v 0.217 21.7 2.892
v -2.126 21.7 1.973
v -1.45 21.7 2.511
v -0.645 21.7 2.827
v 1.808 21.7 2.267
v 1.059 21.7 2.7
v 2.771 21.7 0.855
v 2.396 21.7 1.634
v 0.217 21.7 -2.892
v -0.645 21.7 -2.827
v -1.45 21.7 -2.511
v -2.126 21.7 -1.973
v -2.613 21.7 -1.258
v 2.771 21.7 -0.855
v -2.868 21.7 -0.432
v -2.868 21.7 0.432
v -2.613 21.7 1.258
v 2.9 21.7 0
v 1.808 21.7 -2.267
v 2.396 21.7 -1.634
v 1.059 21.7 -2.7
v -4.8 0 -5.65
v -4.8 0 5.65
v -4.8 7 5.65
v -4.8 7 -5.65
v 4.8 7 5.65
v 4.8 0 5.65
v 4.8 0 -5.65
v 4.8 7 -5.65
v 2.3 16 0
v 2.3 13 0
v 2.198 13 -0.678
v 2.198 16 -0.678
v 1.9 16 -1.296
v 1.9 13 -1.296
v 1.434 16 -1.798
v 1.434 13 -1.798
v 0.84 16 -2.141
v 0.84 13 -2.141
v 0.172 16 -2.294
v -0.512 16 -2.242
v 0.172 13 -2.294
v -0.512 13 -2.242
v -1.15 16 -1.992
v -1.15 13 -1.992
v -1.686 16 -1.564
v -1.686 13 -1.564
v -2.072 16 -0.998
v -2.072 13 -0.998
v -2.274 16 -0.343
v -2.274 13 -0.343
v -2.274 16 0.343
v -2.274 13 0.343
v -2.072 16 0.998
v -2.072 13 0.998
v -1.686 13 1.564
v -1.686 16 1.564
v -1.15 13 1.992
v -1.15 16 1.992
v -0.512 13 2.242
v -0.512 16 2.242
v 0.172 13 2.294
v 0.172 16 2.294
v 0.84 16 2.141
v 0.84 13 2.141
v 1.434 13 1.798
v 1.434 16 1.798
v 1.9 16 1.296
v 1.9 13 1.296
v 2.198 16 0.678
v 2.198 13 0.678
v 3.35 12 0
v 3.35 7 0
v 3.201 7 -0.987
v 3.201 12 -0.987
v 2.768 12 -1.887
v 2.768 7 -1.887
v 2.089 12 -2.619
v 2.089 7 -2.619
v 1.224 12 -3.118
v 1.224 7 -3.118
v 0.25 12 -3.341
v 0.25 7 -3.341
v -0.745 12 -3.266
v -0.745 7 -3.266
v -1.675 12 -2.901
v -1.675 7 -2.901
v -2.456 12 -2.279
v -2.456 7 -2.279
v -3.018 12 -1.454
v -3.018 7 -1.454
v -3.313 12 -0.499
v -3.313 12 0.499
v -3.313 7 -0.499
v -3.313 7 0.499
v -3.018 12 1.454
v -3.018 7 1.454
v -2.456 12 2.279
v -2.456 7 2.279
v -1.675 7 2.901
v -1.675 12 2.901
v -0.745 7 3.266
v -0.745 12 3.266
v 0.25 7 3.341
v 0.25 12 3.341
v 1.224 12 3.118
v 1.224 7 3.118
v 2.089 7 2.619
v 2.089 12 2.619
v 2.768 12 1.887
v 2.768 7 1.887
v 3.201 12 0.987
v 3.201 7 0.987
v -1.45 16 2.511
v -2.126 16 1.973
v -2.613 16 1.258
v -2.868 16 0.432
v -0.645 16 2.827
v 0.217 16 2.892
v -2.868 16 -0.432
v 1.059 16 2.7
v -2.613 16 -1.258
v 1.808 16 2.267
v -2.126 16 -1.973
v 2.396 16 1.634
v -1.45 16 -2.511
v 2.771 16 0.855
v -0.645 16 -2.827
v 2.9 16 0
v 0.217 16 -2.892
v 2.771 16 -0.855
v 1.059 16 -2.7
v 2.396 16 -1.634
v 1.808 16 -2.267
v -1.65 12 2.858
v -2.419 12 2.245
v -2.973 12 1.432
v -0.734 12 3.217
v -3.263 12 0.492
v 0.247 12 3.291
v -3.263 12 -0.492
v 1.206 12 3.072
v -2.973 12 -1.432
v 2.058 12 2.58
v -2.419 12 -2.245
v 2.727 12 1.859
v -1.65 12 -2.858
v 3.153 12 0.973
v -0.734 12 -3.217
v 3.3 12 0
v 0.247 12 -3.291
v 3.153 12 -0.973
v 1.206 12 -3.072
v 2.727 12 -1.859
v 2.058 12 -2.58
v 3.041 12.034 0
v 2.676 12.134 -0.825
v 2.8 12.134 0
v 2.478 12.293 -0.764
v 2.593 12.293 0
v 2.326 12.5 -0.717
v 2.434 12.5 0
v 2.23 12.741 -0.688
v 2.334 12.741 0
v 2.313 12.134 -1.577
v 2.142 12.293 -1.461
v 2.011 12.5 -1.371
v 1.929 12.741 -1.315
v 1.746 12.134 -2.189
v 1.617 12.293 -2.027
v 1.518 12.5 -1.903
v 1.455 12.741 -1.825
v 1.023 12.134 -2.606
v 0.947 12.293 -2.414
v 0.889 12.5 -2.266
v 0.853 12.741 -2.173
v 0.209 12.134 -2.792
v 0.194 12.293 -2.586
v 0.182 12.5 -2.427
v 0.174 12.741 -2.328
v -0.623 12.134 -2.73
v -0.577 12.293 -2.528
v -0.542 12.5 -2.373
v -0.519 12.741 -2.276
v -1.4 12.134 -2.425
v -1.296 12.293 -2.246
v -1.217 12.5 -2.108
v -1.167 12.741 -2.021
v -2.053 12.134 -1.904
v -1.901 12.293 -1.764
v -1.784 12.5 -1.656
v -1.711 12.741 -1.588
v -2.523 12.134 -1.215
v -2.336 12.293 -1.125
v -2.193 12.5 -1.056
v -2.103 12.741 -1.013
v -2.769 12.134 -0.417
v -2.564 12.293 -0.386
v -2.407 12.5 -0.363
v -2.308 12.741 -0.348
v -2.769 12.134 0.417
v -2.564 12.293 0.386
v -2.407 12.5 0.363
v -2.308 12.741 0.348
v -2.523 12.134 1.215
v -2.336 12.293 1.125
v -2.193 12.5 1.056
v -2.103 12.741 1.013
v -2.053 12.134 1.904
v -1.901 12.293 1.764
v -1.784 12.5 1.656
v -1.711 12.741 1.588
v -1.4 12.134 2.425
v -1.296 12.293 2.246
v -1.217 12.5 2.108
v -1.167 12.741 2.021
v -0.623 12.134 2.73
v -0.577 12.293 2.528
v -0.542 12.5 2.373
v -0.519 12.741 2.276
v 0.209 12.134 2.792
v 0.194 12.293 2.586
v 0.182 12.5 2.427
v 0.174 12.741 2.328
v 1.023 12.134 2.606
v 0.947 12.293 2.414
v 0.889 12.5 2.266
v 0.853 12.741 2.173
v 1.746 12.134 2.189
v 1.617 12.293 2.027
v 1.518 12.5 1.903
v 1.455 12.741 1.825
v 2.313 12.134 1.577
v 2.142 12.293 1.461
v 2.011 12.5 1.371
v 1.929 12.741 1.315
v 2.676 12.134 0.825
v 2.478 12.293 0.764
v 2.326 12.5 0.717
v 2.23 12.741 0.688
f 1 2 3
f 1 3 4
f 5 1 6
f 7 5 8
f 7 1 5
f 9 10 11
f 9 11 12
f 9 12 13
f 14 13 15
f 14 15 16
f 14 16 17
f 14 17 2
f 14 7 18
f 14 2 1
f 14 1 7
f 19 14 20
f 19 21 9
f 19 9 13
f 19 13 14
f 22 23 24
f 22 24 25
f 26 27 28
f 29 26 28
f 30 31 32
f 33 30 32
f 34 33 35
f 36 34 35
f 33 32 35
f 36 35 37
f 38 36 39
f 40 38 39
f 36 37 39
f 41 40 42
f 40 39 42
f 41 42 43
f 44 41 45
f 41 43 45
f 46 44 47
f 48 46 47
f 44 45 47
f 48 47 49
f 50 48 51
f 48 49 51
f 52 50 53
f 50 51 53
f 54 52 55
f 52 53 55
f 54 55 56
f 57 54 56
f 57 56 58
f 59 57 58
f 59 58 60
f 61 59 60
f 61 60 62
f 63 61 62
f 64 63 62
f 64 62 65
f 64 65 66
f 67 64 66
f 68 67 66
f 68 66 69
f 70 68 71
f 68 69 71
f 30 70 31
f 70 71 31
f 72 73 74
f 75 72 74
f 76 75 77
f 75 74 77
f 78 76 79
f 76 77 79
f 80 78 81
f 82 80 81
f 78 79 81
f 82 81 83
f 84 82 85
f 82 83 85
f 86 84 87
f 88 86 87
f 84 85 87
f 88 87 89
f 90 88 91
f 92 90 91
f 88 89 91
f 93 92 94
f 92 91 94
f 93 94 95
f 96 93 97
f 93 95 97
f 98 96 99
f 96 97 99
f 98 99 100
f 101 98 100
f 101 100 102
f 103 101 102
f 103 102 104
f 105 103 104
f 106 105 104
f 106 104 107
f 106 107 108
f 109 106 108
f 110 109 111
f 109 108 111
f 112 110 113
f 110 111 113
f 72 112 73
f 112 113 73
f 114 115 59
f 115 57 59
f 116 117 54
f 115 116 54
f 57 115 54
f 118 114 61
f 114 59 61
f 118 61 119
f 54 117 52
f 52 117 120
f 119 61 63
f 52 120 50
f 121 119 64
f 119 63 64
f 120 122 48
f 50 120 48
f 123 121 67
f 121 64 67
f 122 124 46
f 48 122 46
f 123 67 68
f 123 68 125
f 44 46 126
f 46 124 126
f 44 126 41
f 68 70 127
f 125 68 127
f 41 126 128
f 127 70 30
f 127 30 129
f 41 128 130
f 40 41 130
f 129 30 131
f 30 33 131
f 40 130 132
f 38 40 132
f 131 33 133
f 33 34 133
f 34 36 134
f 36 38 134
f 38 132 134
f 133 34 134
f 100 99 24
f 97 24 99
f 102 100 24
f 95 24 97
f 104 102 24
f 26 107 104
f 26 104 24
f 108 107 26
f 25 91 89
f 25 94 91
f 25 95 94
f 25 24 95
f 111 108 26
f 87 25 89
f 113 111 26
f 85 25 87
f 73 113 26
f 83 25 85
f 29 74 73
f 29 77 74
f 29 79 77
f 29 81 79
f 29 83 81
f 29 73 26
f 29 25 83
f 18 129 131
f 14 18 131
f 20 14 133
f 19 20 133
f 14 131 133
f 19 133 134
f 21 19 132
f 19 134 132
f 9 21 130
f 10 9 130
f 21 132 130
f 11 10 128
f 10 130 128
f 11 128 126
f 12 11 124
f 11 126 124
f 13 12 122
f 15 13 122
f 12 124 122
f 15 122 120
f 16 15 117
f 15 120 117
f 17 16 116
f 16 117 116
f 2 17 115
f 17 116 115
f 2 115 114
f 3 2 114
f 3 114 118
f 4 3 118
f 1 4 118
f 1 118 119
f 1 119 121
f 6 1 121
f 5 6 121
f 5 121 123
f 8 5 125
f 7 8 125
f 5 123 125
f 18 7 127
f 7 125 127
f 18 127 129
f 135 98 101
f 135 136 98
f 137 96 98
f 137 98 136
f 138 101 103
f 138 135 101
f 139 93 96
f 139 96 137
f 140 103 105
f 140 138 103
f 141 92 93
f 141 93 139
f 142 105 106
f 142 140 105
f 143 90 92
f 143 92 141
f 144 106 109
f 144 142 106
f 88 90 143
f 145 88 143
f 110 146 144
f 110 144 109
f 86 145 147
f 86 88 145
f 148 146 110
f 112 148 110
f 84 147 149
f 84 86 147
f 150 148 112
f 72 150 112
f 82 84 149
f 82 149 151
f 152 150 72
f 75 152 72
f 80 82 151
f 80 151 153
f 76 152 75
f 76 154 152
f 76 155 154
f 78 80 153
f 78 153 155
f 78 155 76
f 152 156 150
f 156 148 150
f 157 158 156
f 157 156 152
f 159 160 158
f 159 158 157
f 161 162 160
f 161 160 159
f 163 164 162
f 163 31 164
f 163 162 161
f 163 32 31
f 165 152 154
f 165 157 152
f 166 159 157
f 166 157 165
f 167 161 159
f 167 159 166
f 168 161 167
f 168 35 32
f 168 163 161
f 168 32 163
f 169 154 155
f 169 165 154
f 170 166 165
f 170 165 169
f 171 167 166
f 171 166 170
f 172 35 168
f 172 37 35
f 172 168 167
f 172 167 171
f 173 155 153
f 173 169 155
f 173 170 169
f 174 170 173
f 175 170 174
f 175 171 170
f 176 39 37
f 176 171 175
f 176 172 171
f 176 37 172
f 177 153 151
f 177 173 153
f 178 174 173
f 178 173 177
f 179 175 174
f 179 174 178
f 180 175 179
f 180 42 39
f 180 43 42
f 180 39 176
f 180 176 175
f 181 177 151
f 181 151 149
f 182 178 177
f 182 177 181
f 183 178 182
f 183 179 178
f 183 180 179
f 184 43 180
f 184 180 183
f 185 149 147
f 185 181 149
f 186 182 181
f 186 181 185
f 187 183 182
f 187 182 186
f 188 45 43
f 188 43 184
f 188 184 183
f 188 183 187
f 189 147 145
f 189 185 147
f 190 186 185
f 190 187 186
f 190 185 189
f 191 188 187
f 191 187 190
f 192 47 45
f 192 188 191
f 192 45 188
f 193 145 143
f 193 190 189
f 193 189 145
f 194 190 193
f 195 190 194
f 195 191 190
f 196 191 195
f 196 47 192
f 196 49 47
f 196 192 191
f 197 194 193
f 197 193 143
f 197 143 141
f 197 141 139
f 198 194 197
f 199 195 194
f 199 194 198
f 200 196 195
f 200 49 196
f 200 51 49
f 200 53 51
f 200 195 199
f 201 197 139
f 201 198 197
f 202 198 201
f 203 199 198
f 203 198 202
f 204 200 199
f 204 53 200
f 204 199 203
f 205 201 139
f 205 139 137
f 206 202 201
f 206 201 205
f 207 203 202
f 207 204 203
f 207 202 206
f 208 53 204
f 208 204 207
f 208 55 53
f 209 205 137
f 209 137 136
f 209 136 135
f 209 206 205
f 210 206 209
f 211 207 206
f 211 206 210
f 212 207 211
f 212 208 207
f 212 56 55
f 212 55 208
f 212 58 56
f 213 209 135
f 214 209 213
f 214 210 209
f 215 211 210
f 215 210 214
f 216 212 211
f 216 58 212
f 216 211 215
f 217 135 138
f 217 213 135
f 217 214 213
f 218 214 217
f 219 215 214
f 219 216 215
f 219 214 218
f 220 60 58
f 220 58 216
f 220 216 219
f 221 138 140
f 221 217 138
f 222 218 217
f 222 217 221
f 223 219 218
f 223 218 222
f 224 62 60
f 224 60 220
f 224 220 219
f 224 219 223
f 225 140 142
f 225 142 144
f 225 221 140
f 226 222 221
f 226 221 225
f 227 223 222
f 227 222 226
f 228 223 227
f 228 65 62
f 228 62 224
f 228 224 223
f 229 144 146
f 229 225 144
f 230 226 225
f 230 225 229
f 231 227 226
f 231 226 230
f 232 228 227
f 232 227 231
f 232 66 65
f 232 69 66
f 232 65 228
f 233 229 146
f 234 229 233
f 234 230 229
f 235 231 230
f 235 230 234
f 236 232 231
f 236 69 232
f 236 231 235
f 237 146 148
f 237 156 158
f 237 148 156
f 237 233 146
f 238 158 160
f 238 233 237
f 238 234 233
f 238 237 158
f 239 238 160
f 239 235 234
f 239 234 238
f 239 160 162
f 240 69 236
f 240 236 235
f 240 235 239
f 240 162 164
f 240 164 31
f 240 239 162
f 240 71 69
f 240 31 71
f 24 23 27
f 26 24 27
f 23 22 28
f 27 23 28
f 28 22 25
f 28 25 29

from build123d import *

# Parameters (mm, degrees)
SKETCH1_W           = 9.6
SKETCH1_H           = 11.3
BOSS_EXTRUDE1_DEPTH = 7
SKETCH2_R           = 3.35
BOSS_EXTRUDE2_DEPTH = 5
SKETCH3_R           = 2.3
BOSS_EXTRUDE3_DEPTH = 4
FILLET1_R           = 1
SKETCH4_R           = 2.9
BOSS_EXTRUDE4_DEPTH = 5.7


with BuildPart() as part:
    # Sketch1 → Boss-Extrude1 (new body)
    with BuildSketch(Plane(origin=(0, 0, 0), x_dir=(1, 0, 0), z_dir=(0, 1, 0))):
        Rectangle(SKETCH1_W, SKETCH1_H)
    extrude(amount=BOSS_EXTRUDE1_DEPTH)

    # Sketch2 → Boss-Extrude2 (add)
    with BuildSketch(Plane(origin=(0, 7, 0), x_dir=(1, 0, 0), z_dir=(0, 1, 0))):
        Circle(SKETCH2_R)
    extrude(amount=BOSS_EXTRUDE2_DEPTH)

    # Sketch3 → Boss-Extrude3 (add)
    with BuildSketch(Plane(origin=(0, 12, 0), x_dir=(1, 0, 0), z_dir=(0, 1, 0))):
        Circle(SKETCH3_R)
    extrude(amount=BOSS_EXTRUDE3_DEPTH)

    # Fillet1
    fillet1_edges = [part.edges().sort_by_distance(p)[0] for p in [
        (-2.3, 12, 0),
    ]]
    fillet(fillet1_edges, radius=FILLET1_R)

    # Sketch4 → Boss-Extrude4 (add)
    with BuildSketch(Plane(origin=(0, 16, 0), x_dir=(1, 0, 0), z_dir=(0, 1, 0))):
        Circle(SKETCH4_R)
    extrude(amount=BOSS_EXTRUDE4_DEPTH)


solid = part.part
